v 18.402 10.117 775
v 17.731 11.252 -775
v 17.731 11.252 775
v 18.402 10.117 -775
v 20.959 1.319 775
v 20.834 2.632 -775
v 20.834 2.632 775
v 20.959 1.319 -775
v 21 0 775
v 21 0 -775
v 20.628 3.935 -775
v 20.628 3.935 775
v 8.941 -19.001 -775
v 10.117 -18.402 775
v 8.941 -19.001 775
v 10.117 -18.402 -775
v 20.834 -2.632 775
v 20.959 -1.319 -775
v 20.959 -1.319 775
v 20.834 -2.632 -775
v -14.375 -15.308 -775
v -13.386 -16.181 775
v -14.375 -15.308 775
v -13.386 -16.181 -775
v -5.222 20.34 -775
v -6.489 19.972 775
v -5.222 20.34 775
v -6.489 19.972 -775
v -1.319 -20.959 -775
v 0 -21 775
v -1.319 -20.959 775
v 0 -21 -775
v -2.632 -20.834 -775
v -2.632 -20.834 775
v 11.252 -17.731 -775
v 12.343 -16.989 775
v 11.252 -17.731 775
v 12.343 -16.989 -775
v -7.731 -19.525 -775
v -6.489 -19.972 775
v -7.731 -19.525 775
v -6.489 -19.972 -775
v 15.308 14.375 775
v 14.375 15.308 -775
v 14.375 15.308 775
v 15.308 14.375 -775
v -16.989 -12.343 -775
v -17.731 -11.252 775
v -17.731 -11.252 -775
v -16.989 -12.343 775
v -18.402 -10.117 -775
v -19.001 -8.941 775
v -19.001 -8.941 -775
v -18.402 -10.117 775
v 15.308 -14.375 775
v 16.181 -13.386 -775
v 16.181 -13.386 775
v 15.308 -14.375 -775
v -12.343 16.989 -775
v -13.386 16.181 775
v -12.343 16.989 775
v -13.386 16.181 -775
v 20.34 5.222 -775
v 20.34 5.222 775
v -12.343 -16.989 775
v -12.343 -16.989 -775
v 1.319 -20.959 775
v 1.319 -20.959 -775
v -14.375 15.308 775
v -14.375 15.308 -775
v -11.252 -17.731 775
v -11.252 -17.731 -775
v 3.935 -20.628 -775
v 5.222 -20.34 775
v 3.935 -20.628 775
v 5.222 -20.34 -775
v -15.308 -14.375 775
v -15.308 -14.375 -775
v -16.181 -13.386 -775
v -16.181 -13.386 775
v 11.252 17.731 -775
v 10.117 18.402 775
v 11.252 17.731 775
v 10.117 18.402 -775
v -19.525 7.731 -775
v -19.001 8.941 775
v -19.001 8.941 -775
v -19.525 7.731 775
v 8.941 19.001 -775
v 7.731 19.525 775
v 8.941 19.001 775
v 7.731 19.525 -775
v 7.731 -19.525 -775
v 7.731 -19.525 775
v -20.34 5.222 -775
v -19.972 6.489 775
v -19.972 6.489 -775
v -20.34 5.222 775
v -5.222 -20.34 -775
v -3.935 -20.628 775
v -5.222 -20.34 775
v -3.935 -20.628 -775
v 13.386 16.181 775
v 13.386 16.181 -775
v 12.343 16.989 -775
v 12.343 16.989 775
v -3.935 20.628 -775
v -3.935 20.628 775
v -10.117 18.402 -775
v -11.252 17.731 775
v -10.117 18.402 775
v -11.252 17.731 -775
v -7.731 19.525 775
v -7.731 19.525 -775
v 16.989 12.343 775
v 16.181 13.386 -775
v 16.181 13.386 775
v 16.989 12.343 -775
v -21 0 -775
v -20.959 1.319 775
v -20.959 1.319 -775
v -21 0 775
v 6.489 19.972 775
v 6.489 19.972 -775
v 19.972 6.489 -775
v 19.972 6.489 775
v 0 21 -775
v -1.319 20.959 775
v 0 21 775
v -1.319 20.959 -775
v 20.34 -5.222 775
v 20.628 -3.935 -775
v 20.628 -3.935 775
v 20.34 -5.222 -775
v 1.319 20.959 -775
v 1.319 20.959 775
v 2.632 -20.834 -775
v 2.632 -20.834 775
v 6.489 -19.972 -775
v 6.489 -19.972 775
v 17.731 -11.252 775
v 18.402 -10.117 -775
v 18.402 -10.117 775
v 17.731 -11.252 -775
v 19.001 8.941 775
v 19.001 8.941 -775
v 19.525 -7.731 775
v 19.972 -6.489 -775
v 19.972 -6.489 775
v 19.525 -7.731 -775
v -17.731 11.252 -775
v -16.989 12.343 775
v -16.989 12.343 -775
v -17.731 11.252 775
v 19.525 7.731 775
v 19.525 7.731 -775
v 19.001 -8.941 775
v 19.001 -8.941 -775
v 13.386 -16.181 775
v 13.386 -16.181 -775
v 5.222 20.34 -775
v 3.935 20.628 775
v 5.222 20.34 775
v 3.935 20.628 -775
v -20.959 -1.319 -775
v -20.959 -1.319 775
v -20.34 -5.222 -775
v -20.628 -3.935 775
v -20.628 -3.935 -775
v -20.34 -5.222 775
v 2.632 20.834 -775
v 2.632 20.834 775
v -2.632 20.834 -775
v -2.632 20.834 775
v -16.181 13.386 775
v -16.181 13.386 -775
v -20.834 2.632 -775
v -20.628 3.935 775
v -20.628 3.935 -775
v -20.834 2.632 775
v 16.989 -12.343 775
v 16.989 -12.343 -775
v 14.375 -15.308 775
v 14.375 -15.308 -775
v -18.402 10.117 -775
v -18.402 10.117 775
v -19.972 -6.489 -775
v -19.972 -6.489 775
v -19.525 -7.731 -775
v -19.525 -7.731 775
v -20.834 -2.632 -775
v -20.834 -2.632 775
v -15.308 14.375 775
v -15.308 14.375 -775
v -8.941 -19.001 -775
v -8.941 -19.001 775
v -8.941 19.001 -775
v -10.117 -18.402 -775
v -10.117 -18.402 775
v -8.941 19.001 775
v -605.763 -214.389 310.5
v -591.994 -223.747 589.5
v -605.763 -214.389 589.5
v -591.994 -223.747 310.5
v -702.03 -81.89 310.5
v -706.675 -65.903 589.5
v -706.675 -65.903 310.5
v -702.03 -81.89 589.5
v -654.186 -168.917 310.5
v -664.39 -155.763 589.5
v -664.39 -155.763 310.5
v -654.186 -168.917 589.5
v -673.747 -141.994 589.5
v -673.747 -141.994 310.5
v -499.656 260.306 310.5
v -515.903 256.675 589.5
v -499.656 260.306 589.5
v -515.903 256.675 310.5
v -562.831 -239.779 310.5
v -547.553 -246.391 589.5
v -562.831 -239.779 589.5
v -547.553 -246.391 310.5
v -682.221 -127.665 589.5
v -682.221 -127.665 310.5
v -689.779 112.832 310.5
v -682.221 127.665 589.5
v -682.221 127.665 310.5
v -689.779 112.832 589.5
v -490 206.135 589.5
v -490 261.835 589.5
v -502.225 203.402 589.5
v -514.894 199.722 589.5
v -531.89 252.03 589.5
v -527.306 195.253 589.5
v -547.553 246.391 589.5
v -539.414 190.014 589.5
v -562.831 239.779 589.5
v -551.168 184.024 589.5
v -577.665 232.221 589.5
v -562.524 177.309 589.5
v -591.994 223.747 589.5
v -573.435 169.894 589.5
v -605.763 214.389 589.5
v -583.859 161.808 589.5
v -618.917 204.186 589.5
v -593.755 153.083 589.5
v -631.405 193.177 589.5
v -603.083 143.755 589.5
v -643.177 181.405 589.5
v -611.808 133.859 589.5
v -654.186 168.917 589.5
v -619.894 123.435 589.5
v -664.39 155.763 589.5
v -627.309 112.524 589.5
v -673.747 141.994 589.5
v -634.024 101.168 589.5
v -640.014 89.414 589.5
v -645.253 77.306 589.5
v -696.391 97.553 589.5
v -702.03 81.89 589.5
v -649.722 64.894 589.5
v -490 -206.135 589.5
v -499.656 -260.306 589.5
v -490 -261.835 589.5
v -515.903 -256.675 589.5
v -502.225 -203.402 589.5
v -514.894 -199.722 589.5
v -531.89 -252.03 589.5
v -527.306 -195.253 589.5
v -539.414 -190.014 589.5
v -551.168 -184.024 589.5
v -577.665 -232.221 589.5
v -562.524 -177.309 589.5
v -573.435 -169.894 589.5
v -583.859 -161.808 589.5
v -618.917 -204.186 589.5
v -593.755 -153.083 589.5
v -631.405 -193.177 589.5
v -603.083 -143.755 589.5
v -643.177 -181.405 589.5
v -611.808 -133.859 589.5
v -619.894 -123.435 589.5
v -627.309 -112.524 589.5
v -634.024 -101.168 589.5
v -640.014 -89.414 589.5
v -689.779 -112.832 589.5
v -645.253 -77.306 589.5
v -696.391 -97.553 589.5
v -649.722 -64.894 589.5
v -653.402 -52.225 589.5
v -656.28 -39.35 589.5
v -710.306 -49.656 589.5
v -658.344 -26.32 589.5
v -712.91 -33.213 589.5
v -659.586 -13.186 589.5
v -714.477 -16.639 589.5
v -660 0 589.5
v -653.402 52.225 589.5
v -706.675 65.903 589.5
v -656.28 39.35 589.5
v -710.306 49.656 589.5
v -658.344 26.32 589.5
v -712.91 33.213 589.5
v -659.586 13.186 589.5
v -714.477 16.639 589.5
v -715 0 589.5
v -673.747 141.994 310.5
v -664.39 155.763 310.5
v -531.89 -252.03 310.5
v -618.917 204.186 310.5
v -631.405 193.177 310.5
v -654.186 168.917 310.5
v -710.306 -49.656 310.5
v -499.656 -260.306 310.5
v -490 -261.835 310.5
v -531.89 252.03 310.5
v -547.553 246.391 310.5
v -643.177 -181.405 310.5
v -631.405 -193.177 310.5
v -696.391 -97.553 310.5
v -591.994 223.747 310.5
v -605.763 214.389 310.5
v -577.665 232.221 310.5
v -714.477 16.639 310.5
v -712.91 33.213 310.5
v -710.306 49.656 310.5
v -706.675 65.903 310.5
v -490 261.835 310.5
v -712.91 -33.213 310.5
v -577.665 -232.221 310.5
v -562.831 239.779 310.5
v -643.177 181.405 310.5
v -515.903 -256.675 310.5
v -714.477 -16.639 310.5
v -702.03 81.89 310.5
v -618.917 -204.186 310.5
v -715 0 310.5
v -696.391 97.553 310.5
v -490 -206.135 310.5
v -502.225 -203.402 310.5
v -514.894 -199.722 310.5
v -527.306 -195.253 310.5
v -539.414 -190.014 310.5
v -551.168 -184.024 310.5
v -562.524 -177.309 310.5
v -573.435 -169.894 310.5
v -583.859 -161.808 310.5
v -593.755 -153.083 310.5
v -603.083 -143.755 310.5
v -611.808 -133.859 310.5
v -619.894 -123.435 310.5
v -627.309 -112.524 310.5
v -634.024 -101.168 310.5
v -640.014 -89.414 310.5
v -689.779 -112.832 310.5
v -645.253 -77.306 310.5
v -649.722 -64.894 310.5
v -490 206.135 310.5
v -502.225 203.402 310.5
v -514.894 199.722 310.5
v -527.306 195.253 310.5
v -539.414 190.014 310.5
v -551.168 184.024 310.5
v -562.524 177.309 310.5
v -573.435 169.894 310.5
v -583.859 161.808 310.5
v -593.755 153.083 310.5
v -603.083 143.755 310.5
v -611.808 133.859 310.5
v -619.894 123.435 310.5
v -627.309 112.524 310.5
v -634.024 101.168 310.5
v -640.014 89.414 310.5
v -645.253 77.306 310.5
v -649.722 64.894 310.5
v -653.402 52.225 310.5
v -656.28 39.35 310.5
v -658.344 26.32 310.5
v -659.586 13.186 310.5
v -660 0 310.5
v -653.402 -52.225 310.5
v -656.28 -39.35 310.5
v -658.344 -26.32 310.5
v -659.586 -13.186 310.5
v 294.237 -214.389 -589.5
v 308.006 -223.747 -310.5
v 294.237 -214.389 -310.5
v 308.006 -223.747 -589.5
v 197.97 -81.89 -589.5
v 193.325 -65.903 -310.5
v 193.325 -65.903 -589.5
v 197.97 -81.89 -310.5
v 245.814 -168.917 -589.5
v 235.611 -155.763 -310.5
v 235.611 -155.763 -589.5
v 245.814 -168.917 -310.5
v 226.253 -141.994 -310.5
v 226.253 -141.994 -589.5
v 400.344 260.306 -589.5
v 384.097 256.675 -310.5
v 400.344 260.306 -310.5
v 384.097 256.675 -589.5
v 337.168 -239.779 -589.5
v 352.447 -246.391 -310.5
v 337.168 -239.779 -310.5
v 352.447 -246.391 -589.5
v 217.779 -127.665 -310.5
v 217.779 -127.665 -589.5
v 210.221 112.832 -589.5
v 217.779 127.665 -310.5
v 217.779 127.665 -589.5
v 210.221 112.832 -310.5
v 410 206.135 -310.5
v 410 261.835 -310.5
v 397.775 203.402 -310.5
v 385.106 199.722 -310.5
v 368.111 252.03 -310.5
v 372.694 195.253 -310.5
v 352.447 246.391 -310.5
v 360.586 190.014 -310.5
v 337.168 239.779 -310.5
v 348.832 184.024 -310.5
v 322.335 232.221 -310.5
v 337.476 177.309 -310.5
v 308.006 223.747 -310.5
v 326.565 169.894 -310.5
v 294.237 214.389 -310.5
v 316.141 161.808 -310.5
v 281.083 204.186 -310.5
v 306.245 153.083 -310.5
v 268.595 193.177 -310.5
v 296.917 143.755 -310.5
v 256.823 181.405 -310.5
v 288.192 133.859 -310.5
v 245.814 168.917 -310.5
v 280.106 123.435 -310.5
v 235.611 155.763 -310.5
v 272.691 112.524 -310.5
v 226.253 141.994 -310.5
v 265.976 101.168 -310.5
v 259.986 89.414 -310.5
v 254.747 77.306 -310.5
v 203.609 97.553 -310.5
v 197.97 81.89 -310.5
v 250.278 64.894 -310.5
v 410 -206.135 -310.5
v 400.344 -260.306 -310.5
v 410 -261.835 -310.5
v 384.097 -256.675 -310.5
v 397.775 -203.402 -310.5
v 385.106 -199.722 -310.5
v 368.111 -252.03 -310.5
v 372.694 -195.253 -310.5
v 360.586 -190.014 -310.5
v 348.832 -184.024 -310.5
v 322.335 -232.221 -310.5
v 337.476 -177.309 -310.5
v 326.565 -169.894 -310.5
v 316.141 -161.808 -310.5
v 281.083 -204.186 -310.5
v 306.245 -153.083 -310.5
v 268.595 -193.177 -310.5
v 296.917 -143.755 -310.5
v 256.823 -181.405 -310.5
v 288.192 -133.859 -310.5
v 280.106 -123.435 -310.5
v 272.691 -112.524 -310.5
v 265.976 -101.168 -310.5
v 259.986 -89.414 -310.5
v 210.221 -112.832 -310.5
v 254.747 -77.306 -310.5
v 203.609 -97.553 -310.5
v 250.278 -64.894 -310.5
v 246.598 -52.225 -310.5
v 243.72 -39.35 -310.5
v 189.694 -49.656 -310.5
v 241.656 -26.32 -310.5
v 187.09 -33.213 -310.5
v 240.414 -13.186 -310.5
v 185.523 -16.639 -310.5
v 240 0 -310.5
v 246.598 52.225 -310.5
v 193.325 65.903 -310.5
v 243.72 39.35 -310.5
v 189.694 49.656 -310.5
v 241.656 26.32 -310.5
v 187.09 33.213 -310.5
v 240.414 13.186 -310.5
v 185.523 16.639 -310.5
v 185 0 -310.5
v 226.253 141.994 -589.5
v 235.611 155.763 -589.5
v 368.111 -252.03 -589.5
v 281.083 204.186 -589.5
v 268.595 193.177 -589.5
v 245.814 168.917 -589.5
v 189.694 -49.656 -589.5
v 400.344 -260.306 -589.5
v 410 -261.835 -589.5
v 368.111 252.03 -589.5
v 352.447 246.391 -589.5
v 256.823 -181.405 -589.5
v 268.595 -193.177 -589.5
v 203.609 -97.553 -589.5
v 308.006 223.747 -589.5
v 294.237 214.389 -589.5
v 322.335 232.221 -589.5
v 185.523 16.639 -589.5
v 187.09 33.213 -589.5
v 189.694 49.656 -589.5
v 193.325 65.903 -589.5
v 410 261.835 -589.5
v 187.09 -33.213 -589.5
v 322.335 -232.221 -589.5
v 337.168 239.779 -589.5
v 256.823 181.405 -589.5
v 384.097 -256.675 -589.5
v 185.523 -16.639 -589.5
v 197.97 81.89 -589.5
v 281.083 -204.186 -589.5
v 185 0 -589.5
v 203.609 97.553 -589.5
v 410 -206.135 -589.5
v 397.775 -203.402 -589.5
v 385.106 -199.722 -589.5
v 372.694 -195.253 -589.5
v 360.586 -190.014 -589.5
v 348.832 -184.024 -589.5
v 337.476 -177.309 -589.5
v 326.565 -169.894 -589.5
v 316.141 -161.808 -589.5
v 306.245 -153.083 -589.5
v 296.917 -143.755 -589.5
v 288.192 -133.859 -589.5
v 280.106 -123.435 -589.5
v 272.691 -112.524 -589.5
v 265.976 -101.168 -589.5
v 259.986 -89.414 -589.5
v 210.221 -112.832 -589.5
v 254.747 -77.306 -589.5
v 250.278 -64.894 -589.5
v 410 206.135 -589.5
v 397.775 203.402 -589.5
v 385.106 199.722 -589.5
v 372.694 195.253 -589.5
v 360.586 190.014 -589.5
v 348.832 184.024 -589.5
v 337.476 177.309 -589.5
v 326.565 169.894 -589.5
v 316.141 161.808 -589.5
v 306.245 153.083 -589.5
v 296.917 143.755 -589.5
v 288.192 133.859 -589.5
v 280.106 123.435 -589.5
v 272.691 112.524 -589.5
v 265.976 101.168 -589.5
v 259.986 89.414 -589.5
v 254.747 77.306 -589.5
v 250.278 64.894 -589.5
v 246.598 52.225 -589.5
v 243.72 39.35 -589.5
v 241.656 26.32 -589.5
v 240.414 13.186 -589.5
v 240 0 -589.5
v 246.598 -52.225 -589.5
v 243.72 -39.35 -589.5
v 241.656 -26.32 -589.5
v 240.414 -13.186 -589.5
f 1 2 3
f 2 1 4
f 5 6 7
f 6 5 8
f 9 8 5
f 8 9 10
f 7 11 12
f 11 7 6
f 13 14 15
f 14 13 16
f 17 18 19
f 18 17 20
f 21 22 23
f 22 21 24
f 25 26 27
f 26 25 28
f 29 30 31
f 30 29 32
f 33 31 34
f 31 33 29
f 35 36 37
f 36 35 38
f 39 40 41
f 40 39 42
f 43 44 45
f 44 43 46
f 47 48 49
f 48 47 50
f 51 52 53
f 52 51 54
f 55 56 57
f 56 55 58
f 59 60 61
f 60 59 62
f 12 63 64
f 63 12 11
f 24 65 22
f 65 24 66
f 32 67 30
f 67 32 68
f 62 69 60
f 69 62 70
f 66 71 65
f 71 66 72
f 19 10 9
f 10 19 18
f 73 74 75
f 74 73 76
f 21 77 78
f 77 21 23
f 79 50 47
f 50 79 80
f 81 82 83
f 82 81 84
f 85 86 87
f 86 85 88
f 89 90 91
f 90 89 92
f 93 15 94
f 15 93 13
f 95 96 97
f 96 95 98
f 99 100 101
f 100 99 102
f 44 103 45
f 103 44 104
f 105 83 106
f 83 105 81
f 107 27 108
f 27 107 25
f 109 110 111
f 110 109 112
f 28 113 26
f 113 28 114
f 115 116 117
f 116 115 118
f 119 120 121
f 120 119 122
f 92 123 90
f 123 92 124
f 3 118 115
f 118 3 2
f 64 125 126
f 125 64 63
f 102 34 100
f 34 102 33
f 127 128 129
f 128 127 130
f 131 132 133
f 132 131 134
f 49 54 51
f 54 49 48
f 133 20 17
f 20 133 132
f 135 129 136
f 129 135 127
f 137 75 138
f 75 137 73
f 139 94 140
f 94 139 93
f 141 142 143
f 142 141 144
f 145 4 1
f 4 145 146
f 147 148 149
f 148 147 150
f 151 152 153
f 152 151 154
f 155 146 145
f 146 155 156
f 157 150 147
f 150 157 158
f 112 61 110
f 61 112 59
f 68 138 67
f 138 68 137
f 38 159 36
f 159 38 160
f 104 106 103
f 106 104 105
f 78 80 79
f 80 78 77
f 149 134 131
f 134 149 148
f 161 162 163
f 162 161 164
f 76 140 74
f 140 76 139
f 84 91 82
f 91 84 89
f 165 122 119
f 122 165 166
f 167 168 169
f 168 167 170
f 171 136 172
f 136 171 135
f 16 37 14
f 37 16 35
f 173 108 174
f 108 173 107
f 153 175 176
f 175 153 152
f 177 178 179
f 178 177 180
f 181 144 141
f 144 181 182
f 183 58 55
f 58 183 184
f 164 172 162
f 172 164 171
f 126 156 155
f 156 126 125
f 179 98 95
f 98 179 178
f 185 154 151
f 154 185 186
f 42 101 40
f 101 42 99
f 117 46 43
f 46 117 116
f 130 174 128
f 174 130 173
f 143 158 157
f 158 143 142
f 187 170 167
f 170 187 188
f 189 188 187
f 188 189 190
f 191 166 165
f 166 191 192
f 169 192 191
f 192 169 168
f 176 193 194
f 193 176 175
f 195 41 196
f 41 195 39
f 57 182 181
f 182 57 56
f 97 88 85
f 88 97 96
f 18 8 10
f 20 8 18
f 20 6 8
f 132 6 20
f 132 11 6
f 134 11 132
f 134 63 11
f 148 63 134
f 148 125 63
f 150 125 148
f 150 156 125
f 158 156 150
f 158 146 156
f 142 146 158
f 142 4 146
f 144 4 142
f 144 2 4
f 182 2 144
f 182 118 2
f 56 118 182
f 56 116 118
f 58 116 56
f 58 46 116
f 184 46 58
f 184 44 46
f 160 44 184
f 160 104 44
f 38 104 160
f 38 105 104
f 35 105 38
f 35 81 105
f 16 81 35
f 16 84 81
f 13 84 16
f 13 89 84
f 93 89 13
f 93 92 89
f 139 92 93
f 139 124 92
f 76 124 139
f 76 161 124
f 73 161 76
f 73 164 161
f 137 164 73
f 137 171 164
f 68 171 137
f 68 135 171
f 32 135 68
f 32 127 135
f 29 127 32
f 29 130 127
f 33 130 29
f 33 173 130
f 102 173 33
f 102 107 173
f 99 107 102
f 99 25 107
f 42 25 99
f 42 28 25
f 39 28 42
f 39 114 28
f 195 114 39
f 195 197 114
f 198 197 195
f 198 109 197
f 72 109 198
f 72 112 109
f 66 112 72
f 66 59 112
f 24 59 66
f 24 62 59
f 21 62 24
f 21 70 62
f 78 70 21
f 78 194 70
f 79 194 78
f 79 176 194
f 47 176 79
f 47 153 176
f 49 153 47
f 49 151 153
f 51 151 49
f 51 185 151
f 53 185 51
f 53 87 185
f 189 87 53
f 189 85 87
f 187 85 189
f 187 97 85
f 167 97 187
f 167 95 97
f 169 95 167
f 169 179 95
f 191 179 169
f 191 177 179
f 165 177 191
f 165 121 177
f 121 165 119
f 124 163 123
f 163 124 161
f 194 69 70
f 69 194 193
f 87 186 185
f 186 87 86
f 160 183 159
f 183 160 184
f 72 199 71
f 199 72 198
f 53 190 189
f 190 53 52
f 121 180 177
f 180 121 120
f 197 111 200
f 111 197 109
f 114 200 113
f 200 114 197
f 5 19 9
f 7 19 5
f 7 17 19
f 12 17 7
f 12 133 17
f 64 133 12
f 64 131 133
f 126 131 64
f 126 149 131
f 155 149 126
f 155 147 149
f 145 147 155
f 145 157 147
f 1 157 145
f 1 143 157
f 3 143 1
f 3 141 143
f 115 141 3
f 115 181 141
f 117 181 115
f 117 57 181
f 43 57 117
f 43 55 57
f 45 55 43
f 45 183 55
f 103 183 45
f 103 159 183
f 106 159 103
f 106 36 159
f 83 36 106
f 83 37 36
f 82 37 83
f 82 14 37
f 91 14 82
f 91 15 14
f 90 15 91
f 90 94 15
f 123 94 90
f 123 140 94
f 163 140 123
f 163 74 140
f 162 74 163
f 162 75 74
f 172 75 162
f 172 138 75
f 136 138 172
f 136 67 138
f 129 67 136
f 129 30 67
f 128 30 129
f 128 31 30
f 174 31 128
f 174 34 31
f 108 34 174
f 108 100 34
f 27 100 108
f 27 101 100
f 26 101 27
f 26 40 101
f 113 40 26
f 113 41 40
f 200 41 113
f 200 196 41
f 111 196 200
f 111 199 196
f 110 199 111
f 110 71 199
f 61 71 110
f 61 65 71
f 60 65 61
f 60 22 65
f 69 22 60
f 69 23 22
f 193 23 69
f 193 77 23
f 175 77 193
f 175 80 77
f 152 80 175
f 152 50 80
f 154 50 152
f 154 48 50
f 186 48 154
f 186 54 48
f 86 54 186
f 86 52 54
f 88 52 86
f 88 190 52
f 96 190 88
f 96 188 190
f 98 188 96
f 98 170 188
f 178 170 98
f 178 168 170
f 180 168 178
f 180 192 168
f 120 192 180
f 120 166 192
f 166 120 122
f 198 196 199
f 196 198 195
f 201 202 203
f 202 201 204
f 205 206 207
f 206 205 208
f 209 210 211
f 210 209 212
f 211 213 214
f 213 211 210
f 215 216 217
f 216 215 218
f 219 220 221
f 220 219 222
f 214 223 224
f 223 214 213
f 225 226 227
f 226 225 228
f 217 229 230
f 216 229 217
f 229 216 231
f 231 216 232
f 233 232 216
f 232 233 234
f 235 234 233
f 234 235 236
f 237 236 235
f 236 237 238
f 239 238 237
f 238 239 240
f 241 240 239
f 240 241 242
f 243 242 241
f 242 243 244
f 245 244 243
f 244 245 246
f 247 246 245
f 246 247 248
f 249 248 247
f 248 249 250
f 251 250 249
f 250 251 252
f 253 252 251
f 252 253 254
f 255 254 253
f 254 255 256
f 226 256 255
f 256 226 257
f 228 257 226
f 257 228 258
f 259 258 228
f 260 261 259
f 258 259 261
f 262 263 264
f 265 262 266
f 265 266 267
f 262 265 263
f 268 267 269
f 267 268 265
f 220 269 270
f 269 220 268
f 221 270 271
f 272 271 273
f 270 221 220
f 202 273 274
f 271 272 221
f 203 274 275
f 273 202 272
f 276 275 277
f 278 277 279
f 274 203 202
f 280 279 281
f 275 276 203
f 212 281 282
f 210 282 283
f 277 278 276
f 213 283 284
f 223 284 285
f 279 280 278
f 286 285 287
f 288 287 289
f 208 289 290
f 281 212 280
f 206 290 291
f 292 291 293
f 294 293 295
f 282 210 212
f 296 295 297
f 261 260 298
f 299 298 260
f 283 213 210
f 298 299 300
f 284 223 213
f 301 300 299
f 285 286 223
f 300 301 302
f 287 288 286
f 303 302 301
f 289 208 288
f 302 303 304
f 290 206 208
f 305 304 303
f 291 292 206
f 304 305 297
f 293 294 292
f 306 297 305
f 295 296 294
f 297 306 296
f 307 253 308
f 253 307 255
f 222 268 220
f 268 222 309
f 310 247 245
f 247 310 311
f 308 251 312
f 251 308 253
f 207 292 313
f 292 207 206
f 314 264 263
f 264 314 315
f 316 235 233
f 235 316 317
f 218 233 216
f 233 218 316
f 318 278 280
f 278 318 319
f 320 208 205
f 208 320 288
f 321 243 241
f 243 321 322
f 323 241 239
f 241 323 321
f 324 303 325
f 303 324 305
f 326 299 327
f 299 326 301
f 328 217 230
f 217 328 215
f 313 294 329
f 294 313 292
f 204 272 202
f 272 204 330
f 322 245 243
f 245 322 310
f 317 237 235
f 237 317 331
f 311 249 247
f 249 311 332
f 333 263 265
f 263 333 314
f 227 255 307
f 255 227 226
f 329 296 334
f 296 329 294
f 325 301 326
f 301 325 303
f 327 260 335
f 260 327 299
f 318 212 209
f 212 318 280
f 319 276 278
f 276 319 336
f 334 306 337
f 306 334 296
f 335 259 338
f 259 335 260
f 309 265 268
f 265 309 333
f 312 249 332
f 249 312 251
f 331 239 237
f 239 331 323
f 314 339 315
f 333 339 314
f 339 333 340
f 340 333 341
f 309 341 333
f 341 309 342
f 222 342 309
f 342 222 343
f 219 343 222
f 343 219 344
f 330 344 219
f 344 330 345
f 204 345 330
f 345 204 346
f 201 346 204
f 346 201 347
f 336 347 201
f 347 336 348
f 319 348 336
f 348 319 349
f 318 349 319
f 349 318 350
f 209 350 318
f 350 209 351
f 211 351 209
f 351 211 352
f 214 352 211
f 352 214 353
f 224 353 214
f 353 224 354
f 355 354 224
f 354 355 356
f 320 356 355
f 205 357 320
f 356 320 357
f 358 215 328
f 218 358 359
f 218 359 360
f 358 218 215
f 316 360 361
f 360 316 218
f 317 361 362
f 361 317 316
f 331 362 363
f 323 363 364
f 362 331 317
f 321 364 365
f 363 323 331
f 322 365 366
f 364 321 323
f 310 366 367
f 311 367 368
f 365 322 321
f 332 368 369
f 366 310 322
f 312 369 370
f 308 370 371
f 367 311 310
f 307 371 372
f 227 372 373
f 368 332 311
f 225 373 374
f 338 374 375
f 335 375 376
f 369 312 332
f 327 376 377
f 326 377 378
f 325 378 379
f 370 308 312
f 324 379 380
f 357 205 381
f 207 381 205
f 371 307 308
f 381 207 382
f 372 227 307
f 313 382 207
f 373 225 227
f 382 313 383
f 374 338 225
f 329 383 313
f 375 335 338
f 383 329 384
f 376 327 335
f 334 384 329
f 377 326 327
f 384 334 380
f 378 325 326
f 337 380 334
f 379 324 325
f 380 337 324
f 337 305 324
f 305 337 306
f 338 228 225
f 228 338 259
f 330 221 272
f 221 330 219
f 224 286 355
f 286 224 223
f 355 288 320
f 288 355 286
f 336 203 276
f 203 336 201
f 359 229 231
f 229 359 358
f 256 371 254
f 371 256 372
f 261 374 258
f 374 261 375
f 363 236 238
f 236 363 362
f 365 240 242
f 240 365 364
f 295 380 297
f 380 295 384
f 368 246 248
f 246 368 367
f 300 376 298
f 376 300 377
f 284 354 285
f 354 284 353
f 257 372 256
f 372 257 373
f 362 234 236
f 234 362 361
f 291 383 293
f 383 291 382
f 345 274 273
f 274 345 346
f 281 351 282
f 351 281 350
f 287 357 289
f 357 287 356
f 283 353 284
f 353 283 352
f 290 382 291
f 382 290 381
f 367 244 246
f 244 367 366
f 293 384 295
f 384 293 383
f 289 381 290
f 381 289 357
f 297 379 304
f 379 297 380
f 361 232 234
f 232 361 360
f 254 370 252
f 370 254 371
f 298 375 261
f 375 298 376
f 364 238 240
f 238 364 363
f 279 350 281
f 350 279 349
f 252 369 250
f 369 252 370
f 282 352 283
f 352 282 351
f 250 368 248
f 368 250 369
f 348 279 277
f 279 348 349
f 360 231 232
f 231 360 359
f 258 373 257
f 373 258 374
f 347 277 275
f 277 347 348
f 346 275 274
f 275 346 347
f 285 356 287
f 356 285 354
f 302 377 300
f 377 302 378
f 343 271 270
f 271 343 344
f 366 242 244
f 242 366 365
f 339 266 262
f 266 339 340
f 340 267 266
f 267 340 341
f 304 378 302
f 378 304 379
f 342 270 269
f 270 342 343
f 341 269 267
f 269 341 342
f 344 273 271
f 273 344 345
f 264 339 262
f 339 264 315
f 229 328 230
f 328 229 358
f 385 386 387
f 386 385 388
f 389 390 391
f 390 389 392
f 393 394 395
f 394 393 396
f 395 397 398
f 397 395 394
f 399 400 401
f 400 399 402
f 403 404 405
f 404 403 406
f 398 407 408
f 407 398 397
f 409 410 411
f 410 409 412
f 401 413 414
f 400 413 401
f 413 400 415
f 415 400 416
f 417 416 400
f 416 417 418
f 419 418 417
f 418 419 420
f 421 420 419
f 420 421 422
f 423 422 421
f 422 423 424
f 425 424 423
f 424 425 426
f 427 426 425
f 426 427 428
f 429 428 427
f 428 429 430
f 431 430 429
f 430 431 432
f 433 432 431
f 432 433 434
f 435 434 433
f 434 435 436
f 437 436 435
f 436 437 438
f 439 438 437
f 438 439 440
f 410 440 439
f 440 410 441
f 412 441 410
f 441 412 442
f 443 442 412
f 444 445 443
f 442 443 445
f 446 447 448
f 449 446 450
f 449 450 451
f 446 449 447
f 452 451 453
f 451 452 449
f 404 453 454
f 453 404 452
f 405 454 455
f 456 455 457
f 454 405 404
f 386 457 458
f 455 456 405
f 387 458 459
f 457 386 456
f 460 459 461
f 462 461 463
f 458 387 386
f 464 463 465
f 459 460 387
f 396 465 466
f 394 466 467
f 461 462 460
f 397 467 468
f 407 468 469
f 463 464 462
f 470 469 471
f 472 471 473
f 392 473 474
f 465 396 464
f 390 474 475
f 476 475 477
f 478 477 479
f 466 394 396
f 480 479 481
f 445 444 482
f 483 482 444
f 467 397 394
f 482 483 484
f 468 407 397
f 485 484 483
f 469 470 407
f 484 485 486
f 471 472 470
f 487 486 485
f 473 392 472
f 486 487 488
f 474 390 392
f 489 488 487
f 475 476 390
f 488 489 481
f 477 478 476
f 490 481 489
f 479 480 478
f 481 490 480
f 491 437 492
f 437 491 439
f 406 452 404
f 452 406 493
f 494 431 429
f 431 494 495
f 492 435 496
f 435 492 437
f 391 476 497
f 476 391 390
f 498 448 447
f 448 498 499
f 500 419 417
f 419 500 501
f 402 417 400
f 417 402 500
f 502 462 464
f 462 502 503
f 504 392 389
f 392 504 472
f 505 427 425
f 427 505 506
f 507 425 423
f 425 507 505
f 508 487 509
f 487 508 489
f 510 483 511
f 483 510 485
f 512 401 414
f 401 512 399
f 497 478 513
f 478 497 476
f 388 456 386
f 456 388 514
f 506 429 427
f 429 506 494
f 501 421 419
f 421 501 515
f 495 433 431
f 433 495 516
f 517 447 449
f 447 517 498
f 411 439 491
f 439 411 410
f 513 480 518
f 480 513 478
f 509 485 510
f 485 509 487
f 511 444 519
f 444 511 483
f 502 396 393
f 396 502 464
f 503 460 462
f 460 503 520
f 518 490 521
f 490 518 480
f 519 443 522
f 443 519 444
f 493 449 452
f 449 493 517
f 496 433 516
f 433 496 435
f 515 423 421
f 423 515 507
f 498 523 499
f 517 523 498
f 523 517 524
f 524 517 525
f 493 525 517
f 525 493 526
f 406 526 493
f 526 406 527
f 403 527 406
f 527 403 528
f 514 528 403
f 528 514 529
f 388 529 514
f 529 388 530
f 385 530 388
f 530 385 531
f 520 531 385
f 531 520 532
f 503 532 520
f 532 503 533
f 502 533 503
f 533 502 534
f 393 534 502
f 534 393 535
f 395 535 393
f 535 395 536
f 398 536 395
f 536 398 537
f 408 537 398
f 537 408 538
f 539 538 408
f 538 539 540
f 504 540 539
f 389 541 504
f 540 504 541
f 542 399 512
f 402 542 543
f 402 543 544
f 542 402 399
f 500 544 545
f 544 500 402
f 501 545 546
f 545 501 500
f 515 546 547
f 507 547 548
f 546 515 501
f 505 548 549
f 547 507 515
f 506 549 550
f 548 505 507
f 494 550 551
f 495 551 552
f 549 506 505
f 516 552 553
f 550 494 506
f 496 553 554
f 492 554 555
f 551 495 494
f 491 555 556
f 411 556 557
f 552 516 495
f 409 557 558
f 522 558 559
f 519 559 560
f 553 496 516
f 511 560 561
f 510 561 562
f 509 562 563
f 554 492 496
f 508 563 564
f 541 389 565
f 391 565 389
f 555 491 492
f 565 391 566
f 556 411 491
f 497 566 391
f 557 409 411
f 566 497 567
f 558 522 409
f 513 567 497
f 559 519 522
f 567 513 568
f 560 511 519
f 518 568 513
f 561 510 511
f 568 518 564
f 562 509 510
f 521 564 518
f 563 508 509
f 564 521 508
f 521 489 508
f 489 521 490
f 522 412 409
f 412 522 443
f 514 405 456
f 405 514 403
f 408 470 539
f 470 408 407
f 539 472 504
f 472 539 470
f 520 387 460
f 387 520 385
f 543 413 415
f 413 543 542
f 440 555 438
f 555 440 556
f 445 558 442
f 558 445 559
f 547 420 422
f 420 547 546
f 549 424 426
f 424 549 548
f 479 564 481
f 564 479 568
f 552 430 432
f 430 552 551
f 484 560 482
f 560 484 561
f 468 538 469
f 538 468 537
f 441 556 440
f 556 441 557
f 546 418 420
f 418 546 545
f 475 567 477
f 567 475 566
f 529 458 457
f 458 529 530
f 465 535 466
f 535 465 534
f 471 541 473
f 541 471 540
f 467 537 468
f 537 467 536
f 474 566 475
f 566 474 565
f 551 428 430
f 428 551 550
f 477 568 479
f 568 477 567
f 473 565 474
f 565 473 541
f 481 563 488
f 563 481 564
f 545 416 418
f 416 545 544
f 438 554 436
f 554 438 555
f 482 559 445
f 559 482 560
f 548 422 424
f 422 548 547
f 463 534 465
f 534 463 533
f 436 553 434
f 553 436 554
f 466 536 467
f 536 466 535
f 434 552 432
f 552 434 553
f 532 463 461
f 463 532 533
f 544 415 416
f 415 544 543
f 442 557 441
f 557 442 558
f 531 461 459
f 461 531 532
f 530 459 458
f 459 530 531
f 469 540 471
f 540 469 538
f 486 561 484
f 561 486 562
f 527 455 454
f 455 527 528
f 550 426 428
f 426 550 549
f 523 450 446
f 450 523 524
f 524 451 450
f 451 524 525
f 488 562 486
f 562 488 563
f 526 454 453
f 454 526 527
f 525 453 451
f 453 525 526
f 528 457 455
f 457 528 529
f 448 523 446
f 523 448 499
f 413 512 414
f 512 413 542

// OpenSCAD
// ============================================================================
// PROJECT: XXXG-00W0 WING GUNDAM ZERO EW - UPPER AIRFRAME matrix
// COMPONENT VAULT: BANDAI CAST RUNNER B - SHOULDER LINKS B5 & B6
// MANUFACTURING SPECS: SOLID-STATE CAST-IN INDUCTIVE POWER HARNESS TERMINALS
// DESIGN PARITY: 4,500 Nm RECOIL COMPLIANCE FOR 16.7M BI-PEDAL AIRFRAME
// ============================================================================

$fn = 100; // Circular segment rendering resolution count

// Structural Constants Scaled 1:1 for a 16.7-Meter Airframe Scale (mm)
shoulder_joint_height = 620;            // Total longitudinal joint height (mm)
cycloidal_bore_diameter = 420;          // Inner cycloidal reduction ring bore (mm)
titanium_bone_wall = 55;                // Solid TiAl outer skeletal joint casing (mm)
harness_conduit_width = 80;             // Cast-in 4oz copper logic trace track (mm)

module Runner_B_Shoulder_Link_Forge() {
    // Central Supply Injection Runner Axis (Molten Feed Line from Siphon Forge)
    color([0.22, 0.22, 0.24]) {
        cylinder(h = shoulder_joint_height * 2.5, d = 42, center = true);
        // Direct injection gates tracking straight into the part mold cavities
        translate() rotate() cylinder(h = 450, d = 22);
        translate([0, 0, -450]) rotate() cylinder(h = 450, d = 22);
    }
    
    // Instantiate Scaled Structural Molds Symmetrically (Left & Right Halves)
    Cast_Internal_Shoulder_Mechanisms();
}

module Cast_Internal_Shoulder_Mechanisms() {
    // ---- PART B5: INTERNAL LEFT UPPER SHOULDER COUPLING SLEEVE ---- [Page 6, Step 4]
    translate([-450, 0, 450]) color([0.4, 0.4, 0.42]) { // Inner Frame Dark Spec
        difference() {
            // Main high-strength structural swivel casing yoke block
            cylinder(h = shoulder_joint_height * 0.45, d = cycloidal_bore_diameter + (titanium_bone_wall * 2), center = true);
            
            // Core Internal Boring for the Cycloidal Pin Rolling Tracks
            cylinder(h = shoulder_joint_height * 0.5, d = cycloidal_bore_diameter, center = true);
            
            // Continuous cast-in routing track for the 4oz solid-state wiring rails
            cube([harness_conduit_width, cycloidal_bore_diameter + 120, shoulder_joint_height], center = true);
            
            // Slicing profile tool to generate an asymmetrical half-shell part component
            translate([cycloidal_bore_diameter, 0, 0])
                cube([cycloidal_bore_diameter * 2, cycloidal_bore_diameter * 2, shoulder_joint_height * 2], center = true);
        }
    }
    
    // ---- PART B6: INTERNAL RIGHT UPPER SHOULDER COUPLING SLEEVE ---- [Page 6, Step 3]
    translate([450, 0, -450]) rotate() color([0.4, 0.4, 0.42]) {
        difference() {
            cylinder(h = shoulder_joint_height * 0.45, d = cycloidal_bore_diameter + (titanium_bone_wall * 2), center = true);
            cylinder(h = shoulder_joint_height * 0.5, d = cycloidal_bore_diameter, center = true);
            cube([harness_conduit_width, cycloidal_bore_diameter + 120, shoulder_joint_height], center = true);
            translate([cycloidal_bore_diameter, 0, 0])
                cube([cycloidal_bore_diameter * 2, cycloidal_bore_diameter * 2, shoulder_joint_height * 2], center = true);
        }
    }
}

// Render Master Assembly to Parameter Workspace
Runner_B_Shoulder_Link_Forge();
